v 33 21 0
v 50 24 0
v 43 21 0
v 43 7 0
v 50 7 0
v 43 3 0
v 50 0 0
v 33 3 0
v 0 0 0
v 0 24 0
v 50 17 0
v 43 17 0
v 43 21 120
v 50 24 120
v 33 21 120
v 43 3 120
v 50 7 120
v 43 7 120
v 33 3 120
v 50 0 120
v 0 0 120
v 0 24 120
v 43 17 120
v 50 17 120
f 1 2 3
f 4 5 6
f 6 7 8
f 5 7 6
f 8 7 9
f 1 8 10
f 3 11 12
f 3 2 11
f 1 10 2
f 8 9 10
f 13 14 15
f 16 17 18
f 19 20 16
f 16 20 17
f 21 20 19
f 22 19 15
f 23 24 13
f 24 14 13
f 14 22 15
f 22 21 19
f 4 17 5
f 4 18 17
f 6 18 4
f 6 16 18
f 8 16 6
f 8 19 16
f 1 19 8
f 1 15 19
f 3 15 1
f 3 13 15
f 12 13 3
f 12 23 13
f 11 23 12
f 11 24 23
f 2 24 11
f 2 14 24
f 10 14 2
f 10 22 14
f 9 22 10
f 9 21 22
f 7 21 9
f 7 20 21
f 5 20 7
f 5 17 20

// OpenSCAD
$fn = 32;

// ----------------------------------------------------------------------
// T-slot rail: 50 x 24 mm section, 120 mm long
// ----------------------------------------------------------------------

// --- parameters (mm) ---
profile_height = 120;     // extrusion height
profile_points = 12;      // points of the closed outline

profile = [[0, 0], [50, 0], [50, 7], [43, 7], [43, 3], [33, 3], [33, 21], [43, 21], [43, 17], [50, 17], [50, 24], [0, 24]];  // single closed polygon, 12 points, counter clockwise

// --- the one profile operation ---
linear_extrude(height = profile_height) polygon(points = profile);
